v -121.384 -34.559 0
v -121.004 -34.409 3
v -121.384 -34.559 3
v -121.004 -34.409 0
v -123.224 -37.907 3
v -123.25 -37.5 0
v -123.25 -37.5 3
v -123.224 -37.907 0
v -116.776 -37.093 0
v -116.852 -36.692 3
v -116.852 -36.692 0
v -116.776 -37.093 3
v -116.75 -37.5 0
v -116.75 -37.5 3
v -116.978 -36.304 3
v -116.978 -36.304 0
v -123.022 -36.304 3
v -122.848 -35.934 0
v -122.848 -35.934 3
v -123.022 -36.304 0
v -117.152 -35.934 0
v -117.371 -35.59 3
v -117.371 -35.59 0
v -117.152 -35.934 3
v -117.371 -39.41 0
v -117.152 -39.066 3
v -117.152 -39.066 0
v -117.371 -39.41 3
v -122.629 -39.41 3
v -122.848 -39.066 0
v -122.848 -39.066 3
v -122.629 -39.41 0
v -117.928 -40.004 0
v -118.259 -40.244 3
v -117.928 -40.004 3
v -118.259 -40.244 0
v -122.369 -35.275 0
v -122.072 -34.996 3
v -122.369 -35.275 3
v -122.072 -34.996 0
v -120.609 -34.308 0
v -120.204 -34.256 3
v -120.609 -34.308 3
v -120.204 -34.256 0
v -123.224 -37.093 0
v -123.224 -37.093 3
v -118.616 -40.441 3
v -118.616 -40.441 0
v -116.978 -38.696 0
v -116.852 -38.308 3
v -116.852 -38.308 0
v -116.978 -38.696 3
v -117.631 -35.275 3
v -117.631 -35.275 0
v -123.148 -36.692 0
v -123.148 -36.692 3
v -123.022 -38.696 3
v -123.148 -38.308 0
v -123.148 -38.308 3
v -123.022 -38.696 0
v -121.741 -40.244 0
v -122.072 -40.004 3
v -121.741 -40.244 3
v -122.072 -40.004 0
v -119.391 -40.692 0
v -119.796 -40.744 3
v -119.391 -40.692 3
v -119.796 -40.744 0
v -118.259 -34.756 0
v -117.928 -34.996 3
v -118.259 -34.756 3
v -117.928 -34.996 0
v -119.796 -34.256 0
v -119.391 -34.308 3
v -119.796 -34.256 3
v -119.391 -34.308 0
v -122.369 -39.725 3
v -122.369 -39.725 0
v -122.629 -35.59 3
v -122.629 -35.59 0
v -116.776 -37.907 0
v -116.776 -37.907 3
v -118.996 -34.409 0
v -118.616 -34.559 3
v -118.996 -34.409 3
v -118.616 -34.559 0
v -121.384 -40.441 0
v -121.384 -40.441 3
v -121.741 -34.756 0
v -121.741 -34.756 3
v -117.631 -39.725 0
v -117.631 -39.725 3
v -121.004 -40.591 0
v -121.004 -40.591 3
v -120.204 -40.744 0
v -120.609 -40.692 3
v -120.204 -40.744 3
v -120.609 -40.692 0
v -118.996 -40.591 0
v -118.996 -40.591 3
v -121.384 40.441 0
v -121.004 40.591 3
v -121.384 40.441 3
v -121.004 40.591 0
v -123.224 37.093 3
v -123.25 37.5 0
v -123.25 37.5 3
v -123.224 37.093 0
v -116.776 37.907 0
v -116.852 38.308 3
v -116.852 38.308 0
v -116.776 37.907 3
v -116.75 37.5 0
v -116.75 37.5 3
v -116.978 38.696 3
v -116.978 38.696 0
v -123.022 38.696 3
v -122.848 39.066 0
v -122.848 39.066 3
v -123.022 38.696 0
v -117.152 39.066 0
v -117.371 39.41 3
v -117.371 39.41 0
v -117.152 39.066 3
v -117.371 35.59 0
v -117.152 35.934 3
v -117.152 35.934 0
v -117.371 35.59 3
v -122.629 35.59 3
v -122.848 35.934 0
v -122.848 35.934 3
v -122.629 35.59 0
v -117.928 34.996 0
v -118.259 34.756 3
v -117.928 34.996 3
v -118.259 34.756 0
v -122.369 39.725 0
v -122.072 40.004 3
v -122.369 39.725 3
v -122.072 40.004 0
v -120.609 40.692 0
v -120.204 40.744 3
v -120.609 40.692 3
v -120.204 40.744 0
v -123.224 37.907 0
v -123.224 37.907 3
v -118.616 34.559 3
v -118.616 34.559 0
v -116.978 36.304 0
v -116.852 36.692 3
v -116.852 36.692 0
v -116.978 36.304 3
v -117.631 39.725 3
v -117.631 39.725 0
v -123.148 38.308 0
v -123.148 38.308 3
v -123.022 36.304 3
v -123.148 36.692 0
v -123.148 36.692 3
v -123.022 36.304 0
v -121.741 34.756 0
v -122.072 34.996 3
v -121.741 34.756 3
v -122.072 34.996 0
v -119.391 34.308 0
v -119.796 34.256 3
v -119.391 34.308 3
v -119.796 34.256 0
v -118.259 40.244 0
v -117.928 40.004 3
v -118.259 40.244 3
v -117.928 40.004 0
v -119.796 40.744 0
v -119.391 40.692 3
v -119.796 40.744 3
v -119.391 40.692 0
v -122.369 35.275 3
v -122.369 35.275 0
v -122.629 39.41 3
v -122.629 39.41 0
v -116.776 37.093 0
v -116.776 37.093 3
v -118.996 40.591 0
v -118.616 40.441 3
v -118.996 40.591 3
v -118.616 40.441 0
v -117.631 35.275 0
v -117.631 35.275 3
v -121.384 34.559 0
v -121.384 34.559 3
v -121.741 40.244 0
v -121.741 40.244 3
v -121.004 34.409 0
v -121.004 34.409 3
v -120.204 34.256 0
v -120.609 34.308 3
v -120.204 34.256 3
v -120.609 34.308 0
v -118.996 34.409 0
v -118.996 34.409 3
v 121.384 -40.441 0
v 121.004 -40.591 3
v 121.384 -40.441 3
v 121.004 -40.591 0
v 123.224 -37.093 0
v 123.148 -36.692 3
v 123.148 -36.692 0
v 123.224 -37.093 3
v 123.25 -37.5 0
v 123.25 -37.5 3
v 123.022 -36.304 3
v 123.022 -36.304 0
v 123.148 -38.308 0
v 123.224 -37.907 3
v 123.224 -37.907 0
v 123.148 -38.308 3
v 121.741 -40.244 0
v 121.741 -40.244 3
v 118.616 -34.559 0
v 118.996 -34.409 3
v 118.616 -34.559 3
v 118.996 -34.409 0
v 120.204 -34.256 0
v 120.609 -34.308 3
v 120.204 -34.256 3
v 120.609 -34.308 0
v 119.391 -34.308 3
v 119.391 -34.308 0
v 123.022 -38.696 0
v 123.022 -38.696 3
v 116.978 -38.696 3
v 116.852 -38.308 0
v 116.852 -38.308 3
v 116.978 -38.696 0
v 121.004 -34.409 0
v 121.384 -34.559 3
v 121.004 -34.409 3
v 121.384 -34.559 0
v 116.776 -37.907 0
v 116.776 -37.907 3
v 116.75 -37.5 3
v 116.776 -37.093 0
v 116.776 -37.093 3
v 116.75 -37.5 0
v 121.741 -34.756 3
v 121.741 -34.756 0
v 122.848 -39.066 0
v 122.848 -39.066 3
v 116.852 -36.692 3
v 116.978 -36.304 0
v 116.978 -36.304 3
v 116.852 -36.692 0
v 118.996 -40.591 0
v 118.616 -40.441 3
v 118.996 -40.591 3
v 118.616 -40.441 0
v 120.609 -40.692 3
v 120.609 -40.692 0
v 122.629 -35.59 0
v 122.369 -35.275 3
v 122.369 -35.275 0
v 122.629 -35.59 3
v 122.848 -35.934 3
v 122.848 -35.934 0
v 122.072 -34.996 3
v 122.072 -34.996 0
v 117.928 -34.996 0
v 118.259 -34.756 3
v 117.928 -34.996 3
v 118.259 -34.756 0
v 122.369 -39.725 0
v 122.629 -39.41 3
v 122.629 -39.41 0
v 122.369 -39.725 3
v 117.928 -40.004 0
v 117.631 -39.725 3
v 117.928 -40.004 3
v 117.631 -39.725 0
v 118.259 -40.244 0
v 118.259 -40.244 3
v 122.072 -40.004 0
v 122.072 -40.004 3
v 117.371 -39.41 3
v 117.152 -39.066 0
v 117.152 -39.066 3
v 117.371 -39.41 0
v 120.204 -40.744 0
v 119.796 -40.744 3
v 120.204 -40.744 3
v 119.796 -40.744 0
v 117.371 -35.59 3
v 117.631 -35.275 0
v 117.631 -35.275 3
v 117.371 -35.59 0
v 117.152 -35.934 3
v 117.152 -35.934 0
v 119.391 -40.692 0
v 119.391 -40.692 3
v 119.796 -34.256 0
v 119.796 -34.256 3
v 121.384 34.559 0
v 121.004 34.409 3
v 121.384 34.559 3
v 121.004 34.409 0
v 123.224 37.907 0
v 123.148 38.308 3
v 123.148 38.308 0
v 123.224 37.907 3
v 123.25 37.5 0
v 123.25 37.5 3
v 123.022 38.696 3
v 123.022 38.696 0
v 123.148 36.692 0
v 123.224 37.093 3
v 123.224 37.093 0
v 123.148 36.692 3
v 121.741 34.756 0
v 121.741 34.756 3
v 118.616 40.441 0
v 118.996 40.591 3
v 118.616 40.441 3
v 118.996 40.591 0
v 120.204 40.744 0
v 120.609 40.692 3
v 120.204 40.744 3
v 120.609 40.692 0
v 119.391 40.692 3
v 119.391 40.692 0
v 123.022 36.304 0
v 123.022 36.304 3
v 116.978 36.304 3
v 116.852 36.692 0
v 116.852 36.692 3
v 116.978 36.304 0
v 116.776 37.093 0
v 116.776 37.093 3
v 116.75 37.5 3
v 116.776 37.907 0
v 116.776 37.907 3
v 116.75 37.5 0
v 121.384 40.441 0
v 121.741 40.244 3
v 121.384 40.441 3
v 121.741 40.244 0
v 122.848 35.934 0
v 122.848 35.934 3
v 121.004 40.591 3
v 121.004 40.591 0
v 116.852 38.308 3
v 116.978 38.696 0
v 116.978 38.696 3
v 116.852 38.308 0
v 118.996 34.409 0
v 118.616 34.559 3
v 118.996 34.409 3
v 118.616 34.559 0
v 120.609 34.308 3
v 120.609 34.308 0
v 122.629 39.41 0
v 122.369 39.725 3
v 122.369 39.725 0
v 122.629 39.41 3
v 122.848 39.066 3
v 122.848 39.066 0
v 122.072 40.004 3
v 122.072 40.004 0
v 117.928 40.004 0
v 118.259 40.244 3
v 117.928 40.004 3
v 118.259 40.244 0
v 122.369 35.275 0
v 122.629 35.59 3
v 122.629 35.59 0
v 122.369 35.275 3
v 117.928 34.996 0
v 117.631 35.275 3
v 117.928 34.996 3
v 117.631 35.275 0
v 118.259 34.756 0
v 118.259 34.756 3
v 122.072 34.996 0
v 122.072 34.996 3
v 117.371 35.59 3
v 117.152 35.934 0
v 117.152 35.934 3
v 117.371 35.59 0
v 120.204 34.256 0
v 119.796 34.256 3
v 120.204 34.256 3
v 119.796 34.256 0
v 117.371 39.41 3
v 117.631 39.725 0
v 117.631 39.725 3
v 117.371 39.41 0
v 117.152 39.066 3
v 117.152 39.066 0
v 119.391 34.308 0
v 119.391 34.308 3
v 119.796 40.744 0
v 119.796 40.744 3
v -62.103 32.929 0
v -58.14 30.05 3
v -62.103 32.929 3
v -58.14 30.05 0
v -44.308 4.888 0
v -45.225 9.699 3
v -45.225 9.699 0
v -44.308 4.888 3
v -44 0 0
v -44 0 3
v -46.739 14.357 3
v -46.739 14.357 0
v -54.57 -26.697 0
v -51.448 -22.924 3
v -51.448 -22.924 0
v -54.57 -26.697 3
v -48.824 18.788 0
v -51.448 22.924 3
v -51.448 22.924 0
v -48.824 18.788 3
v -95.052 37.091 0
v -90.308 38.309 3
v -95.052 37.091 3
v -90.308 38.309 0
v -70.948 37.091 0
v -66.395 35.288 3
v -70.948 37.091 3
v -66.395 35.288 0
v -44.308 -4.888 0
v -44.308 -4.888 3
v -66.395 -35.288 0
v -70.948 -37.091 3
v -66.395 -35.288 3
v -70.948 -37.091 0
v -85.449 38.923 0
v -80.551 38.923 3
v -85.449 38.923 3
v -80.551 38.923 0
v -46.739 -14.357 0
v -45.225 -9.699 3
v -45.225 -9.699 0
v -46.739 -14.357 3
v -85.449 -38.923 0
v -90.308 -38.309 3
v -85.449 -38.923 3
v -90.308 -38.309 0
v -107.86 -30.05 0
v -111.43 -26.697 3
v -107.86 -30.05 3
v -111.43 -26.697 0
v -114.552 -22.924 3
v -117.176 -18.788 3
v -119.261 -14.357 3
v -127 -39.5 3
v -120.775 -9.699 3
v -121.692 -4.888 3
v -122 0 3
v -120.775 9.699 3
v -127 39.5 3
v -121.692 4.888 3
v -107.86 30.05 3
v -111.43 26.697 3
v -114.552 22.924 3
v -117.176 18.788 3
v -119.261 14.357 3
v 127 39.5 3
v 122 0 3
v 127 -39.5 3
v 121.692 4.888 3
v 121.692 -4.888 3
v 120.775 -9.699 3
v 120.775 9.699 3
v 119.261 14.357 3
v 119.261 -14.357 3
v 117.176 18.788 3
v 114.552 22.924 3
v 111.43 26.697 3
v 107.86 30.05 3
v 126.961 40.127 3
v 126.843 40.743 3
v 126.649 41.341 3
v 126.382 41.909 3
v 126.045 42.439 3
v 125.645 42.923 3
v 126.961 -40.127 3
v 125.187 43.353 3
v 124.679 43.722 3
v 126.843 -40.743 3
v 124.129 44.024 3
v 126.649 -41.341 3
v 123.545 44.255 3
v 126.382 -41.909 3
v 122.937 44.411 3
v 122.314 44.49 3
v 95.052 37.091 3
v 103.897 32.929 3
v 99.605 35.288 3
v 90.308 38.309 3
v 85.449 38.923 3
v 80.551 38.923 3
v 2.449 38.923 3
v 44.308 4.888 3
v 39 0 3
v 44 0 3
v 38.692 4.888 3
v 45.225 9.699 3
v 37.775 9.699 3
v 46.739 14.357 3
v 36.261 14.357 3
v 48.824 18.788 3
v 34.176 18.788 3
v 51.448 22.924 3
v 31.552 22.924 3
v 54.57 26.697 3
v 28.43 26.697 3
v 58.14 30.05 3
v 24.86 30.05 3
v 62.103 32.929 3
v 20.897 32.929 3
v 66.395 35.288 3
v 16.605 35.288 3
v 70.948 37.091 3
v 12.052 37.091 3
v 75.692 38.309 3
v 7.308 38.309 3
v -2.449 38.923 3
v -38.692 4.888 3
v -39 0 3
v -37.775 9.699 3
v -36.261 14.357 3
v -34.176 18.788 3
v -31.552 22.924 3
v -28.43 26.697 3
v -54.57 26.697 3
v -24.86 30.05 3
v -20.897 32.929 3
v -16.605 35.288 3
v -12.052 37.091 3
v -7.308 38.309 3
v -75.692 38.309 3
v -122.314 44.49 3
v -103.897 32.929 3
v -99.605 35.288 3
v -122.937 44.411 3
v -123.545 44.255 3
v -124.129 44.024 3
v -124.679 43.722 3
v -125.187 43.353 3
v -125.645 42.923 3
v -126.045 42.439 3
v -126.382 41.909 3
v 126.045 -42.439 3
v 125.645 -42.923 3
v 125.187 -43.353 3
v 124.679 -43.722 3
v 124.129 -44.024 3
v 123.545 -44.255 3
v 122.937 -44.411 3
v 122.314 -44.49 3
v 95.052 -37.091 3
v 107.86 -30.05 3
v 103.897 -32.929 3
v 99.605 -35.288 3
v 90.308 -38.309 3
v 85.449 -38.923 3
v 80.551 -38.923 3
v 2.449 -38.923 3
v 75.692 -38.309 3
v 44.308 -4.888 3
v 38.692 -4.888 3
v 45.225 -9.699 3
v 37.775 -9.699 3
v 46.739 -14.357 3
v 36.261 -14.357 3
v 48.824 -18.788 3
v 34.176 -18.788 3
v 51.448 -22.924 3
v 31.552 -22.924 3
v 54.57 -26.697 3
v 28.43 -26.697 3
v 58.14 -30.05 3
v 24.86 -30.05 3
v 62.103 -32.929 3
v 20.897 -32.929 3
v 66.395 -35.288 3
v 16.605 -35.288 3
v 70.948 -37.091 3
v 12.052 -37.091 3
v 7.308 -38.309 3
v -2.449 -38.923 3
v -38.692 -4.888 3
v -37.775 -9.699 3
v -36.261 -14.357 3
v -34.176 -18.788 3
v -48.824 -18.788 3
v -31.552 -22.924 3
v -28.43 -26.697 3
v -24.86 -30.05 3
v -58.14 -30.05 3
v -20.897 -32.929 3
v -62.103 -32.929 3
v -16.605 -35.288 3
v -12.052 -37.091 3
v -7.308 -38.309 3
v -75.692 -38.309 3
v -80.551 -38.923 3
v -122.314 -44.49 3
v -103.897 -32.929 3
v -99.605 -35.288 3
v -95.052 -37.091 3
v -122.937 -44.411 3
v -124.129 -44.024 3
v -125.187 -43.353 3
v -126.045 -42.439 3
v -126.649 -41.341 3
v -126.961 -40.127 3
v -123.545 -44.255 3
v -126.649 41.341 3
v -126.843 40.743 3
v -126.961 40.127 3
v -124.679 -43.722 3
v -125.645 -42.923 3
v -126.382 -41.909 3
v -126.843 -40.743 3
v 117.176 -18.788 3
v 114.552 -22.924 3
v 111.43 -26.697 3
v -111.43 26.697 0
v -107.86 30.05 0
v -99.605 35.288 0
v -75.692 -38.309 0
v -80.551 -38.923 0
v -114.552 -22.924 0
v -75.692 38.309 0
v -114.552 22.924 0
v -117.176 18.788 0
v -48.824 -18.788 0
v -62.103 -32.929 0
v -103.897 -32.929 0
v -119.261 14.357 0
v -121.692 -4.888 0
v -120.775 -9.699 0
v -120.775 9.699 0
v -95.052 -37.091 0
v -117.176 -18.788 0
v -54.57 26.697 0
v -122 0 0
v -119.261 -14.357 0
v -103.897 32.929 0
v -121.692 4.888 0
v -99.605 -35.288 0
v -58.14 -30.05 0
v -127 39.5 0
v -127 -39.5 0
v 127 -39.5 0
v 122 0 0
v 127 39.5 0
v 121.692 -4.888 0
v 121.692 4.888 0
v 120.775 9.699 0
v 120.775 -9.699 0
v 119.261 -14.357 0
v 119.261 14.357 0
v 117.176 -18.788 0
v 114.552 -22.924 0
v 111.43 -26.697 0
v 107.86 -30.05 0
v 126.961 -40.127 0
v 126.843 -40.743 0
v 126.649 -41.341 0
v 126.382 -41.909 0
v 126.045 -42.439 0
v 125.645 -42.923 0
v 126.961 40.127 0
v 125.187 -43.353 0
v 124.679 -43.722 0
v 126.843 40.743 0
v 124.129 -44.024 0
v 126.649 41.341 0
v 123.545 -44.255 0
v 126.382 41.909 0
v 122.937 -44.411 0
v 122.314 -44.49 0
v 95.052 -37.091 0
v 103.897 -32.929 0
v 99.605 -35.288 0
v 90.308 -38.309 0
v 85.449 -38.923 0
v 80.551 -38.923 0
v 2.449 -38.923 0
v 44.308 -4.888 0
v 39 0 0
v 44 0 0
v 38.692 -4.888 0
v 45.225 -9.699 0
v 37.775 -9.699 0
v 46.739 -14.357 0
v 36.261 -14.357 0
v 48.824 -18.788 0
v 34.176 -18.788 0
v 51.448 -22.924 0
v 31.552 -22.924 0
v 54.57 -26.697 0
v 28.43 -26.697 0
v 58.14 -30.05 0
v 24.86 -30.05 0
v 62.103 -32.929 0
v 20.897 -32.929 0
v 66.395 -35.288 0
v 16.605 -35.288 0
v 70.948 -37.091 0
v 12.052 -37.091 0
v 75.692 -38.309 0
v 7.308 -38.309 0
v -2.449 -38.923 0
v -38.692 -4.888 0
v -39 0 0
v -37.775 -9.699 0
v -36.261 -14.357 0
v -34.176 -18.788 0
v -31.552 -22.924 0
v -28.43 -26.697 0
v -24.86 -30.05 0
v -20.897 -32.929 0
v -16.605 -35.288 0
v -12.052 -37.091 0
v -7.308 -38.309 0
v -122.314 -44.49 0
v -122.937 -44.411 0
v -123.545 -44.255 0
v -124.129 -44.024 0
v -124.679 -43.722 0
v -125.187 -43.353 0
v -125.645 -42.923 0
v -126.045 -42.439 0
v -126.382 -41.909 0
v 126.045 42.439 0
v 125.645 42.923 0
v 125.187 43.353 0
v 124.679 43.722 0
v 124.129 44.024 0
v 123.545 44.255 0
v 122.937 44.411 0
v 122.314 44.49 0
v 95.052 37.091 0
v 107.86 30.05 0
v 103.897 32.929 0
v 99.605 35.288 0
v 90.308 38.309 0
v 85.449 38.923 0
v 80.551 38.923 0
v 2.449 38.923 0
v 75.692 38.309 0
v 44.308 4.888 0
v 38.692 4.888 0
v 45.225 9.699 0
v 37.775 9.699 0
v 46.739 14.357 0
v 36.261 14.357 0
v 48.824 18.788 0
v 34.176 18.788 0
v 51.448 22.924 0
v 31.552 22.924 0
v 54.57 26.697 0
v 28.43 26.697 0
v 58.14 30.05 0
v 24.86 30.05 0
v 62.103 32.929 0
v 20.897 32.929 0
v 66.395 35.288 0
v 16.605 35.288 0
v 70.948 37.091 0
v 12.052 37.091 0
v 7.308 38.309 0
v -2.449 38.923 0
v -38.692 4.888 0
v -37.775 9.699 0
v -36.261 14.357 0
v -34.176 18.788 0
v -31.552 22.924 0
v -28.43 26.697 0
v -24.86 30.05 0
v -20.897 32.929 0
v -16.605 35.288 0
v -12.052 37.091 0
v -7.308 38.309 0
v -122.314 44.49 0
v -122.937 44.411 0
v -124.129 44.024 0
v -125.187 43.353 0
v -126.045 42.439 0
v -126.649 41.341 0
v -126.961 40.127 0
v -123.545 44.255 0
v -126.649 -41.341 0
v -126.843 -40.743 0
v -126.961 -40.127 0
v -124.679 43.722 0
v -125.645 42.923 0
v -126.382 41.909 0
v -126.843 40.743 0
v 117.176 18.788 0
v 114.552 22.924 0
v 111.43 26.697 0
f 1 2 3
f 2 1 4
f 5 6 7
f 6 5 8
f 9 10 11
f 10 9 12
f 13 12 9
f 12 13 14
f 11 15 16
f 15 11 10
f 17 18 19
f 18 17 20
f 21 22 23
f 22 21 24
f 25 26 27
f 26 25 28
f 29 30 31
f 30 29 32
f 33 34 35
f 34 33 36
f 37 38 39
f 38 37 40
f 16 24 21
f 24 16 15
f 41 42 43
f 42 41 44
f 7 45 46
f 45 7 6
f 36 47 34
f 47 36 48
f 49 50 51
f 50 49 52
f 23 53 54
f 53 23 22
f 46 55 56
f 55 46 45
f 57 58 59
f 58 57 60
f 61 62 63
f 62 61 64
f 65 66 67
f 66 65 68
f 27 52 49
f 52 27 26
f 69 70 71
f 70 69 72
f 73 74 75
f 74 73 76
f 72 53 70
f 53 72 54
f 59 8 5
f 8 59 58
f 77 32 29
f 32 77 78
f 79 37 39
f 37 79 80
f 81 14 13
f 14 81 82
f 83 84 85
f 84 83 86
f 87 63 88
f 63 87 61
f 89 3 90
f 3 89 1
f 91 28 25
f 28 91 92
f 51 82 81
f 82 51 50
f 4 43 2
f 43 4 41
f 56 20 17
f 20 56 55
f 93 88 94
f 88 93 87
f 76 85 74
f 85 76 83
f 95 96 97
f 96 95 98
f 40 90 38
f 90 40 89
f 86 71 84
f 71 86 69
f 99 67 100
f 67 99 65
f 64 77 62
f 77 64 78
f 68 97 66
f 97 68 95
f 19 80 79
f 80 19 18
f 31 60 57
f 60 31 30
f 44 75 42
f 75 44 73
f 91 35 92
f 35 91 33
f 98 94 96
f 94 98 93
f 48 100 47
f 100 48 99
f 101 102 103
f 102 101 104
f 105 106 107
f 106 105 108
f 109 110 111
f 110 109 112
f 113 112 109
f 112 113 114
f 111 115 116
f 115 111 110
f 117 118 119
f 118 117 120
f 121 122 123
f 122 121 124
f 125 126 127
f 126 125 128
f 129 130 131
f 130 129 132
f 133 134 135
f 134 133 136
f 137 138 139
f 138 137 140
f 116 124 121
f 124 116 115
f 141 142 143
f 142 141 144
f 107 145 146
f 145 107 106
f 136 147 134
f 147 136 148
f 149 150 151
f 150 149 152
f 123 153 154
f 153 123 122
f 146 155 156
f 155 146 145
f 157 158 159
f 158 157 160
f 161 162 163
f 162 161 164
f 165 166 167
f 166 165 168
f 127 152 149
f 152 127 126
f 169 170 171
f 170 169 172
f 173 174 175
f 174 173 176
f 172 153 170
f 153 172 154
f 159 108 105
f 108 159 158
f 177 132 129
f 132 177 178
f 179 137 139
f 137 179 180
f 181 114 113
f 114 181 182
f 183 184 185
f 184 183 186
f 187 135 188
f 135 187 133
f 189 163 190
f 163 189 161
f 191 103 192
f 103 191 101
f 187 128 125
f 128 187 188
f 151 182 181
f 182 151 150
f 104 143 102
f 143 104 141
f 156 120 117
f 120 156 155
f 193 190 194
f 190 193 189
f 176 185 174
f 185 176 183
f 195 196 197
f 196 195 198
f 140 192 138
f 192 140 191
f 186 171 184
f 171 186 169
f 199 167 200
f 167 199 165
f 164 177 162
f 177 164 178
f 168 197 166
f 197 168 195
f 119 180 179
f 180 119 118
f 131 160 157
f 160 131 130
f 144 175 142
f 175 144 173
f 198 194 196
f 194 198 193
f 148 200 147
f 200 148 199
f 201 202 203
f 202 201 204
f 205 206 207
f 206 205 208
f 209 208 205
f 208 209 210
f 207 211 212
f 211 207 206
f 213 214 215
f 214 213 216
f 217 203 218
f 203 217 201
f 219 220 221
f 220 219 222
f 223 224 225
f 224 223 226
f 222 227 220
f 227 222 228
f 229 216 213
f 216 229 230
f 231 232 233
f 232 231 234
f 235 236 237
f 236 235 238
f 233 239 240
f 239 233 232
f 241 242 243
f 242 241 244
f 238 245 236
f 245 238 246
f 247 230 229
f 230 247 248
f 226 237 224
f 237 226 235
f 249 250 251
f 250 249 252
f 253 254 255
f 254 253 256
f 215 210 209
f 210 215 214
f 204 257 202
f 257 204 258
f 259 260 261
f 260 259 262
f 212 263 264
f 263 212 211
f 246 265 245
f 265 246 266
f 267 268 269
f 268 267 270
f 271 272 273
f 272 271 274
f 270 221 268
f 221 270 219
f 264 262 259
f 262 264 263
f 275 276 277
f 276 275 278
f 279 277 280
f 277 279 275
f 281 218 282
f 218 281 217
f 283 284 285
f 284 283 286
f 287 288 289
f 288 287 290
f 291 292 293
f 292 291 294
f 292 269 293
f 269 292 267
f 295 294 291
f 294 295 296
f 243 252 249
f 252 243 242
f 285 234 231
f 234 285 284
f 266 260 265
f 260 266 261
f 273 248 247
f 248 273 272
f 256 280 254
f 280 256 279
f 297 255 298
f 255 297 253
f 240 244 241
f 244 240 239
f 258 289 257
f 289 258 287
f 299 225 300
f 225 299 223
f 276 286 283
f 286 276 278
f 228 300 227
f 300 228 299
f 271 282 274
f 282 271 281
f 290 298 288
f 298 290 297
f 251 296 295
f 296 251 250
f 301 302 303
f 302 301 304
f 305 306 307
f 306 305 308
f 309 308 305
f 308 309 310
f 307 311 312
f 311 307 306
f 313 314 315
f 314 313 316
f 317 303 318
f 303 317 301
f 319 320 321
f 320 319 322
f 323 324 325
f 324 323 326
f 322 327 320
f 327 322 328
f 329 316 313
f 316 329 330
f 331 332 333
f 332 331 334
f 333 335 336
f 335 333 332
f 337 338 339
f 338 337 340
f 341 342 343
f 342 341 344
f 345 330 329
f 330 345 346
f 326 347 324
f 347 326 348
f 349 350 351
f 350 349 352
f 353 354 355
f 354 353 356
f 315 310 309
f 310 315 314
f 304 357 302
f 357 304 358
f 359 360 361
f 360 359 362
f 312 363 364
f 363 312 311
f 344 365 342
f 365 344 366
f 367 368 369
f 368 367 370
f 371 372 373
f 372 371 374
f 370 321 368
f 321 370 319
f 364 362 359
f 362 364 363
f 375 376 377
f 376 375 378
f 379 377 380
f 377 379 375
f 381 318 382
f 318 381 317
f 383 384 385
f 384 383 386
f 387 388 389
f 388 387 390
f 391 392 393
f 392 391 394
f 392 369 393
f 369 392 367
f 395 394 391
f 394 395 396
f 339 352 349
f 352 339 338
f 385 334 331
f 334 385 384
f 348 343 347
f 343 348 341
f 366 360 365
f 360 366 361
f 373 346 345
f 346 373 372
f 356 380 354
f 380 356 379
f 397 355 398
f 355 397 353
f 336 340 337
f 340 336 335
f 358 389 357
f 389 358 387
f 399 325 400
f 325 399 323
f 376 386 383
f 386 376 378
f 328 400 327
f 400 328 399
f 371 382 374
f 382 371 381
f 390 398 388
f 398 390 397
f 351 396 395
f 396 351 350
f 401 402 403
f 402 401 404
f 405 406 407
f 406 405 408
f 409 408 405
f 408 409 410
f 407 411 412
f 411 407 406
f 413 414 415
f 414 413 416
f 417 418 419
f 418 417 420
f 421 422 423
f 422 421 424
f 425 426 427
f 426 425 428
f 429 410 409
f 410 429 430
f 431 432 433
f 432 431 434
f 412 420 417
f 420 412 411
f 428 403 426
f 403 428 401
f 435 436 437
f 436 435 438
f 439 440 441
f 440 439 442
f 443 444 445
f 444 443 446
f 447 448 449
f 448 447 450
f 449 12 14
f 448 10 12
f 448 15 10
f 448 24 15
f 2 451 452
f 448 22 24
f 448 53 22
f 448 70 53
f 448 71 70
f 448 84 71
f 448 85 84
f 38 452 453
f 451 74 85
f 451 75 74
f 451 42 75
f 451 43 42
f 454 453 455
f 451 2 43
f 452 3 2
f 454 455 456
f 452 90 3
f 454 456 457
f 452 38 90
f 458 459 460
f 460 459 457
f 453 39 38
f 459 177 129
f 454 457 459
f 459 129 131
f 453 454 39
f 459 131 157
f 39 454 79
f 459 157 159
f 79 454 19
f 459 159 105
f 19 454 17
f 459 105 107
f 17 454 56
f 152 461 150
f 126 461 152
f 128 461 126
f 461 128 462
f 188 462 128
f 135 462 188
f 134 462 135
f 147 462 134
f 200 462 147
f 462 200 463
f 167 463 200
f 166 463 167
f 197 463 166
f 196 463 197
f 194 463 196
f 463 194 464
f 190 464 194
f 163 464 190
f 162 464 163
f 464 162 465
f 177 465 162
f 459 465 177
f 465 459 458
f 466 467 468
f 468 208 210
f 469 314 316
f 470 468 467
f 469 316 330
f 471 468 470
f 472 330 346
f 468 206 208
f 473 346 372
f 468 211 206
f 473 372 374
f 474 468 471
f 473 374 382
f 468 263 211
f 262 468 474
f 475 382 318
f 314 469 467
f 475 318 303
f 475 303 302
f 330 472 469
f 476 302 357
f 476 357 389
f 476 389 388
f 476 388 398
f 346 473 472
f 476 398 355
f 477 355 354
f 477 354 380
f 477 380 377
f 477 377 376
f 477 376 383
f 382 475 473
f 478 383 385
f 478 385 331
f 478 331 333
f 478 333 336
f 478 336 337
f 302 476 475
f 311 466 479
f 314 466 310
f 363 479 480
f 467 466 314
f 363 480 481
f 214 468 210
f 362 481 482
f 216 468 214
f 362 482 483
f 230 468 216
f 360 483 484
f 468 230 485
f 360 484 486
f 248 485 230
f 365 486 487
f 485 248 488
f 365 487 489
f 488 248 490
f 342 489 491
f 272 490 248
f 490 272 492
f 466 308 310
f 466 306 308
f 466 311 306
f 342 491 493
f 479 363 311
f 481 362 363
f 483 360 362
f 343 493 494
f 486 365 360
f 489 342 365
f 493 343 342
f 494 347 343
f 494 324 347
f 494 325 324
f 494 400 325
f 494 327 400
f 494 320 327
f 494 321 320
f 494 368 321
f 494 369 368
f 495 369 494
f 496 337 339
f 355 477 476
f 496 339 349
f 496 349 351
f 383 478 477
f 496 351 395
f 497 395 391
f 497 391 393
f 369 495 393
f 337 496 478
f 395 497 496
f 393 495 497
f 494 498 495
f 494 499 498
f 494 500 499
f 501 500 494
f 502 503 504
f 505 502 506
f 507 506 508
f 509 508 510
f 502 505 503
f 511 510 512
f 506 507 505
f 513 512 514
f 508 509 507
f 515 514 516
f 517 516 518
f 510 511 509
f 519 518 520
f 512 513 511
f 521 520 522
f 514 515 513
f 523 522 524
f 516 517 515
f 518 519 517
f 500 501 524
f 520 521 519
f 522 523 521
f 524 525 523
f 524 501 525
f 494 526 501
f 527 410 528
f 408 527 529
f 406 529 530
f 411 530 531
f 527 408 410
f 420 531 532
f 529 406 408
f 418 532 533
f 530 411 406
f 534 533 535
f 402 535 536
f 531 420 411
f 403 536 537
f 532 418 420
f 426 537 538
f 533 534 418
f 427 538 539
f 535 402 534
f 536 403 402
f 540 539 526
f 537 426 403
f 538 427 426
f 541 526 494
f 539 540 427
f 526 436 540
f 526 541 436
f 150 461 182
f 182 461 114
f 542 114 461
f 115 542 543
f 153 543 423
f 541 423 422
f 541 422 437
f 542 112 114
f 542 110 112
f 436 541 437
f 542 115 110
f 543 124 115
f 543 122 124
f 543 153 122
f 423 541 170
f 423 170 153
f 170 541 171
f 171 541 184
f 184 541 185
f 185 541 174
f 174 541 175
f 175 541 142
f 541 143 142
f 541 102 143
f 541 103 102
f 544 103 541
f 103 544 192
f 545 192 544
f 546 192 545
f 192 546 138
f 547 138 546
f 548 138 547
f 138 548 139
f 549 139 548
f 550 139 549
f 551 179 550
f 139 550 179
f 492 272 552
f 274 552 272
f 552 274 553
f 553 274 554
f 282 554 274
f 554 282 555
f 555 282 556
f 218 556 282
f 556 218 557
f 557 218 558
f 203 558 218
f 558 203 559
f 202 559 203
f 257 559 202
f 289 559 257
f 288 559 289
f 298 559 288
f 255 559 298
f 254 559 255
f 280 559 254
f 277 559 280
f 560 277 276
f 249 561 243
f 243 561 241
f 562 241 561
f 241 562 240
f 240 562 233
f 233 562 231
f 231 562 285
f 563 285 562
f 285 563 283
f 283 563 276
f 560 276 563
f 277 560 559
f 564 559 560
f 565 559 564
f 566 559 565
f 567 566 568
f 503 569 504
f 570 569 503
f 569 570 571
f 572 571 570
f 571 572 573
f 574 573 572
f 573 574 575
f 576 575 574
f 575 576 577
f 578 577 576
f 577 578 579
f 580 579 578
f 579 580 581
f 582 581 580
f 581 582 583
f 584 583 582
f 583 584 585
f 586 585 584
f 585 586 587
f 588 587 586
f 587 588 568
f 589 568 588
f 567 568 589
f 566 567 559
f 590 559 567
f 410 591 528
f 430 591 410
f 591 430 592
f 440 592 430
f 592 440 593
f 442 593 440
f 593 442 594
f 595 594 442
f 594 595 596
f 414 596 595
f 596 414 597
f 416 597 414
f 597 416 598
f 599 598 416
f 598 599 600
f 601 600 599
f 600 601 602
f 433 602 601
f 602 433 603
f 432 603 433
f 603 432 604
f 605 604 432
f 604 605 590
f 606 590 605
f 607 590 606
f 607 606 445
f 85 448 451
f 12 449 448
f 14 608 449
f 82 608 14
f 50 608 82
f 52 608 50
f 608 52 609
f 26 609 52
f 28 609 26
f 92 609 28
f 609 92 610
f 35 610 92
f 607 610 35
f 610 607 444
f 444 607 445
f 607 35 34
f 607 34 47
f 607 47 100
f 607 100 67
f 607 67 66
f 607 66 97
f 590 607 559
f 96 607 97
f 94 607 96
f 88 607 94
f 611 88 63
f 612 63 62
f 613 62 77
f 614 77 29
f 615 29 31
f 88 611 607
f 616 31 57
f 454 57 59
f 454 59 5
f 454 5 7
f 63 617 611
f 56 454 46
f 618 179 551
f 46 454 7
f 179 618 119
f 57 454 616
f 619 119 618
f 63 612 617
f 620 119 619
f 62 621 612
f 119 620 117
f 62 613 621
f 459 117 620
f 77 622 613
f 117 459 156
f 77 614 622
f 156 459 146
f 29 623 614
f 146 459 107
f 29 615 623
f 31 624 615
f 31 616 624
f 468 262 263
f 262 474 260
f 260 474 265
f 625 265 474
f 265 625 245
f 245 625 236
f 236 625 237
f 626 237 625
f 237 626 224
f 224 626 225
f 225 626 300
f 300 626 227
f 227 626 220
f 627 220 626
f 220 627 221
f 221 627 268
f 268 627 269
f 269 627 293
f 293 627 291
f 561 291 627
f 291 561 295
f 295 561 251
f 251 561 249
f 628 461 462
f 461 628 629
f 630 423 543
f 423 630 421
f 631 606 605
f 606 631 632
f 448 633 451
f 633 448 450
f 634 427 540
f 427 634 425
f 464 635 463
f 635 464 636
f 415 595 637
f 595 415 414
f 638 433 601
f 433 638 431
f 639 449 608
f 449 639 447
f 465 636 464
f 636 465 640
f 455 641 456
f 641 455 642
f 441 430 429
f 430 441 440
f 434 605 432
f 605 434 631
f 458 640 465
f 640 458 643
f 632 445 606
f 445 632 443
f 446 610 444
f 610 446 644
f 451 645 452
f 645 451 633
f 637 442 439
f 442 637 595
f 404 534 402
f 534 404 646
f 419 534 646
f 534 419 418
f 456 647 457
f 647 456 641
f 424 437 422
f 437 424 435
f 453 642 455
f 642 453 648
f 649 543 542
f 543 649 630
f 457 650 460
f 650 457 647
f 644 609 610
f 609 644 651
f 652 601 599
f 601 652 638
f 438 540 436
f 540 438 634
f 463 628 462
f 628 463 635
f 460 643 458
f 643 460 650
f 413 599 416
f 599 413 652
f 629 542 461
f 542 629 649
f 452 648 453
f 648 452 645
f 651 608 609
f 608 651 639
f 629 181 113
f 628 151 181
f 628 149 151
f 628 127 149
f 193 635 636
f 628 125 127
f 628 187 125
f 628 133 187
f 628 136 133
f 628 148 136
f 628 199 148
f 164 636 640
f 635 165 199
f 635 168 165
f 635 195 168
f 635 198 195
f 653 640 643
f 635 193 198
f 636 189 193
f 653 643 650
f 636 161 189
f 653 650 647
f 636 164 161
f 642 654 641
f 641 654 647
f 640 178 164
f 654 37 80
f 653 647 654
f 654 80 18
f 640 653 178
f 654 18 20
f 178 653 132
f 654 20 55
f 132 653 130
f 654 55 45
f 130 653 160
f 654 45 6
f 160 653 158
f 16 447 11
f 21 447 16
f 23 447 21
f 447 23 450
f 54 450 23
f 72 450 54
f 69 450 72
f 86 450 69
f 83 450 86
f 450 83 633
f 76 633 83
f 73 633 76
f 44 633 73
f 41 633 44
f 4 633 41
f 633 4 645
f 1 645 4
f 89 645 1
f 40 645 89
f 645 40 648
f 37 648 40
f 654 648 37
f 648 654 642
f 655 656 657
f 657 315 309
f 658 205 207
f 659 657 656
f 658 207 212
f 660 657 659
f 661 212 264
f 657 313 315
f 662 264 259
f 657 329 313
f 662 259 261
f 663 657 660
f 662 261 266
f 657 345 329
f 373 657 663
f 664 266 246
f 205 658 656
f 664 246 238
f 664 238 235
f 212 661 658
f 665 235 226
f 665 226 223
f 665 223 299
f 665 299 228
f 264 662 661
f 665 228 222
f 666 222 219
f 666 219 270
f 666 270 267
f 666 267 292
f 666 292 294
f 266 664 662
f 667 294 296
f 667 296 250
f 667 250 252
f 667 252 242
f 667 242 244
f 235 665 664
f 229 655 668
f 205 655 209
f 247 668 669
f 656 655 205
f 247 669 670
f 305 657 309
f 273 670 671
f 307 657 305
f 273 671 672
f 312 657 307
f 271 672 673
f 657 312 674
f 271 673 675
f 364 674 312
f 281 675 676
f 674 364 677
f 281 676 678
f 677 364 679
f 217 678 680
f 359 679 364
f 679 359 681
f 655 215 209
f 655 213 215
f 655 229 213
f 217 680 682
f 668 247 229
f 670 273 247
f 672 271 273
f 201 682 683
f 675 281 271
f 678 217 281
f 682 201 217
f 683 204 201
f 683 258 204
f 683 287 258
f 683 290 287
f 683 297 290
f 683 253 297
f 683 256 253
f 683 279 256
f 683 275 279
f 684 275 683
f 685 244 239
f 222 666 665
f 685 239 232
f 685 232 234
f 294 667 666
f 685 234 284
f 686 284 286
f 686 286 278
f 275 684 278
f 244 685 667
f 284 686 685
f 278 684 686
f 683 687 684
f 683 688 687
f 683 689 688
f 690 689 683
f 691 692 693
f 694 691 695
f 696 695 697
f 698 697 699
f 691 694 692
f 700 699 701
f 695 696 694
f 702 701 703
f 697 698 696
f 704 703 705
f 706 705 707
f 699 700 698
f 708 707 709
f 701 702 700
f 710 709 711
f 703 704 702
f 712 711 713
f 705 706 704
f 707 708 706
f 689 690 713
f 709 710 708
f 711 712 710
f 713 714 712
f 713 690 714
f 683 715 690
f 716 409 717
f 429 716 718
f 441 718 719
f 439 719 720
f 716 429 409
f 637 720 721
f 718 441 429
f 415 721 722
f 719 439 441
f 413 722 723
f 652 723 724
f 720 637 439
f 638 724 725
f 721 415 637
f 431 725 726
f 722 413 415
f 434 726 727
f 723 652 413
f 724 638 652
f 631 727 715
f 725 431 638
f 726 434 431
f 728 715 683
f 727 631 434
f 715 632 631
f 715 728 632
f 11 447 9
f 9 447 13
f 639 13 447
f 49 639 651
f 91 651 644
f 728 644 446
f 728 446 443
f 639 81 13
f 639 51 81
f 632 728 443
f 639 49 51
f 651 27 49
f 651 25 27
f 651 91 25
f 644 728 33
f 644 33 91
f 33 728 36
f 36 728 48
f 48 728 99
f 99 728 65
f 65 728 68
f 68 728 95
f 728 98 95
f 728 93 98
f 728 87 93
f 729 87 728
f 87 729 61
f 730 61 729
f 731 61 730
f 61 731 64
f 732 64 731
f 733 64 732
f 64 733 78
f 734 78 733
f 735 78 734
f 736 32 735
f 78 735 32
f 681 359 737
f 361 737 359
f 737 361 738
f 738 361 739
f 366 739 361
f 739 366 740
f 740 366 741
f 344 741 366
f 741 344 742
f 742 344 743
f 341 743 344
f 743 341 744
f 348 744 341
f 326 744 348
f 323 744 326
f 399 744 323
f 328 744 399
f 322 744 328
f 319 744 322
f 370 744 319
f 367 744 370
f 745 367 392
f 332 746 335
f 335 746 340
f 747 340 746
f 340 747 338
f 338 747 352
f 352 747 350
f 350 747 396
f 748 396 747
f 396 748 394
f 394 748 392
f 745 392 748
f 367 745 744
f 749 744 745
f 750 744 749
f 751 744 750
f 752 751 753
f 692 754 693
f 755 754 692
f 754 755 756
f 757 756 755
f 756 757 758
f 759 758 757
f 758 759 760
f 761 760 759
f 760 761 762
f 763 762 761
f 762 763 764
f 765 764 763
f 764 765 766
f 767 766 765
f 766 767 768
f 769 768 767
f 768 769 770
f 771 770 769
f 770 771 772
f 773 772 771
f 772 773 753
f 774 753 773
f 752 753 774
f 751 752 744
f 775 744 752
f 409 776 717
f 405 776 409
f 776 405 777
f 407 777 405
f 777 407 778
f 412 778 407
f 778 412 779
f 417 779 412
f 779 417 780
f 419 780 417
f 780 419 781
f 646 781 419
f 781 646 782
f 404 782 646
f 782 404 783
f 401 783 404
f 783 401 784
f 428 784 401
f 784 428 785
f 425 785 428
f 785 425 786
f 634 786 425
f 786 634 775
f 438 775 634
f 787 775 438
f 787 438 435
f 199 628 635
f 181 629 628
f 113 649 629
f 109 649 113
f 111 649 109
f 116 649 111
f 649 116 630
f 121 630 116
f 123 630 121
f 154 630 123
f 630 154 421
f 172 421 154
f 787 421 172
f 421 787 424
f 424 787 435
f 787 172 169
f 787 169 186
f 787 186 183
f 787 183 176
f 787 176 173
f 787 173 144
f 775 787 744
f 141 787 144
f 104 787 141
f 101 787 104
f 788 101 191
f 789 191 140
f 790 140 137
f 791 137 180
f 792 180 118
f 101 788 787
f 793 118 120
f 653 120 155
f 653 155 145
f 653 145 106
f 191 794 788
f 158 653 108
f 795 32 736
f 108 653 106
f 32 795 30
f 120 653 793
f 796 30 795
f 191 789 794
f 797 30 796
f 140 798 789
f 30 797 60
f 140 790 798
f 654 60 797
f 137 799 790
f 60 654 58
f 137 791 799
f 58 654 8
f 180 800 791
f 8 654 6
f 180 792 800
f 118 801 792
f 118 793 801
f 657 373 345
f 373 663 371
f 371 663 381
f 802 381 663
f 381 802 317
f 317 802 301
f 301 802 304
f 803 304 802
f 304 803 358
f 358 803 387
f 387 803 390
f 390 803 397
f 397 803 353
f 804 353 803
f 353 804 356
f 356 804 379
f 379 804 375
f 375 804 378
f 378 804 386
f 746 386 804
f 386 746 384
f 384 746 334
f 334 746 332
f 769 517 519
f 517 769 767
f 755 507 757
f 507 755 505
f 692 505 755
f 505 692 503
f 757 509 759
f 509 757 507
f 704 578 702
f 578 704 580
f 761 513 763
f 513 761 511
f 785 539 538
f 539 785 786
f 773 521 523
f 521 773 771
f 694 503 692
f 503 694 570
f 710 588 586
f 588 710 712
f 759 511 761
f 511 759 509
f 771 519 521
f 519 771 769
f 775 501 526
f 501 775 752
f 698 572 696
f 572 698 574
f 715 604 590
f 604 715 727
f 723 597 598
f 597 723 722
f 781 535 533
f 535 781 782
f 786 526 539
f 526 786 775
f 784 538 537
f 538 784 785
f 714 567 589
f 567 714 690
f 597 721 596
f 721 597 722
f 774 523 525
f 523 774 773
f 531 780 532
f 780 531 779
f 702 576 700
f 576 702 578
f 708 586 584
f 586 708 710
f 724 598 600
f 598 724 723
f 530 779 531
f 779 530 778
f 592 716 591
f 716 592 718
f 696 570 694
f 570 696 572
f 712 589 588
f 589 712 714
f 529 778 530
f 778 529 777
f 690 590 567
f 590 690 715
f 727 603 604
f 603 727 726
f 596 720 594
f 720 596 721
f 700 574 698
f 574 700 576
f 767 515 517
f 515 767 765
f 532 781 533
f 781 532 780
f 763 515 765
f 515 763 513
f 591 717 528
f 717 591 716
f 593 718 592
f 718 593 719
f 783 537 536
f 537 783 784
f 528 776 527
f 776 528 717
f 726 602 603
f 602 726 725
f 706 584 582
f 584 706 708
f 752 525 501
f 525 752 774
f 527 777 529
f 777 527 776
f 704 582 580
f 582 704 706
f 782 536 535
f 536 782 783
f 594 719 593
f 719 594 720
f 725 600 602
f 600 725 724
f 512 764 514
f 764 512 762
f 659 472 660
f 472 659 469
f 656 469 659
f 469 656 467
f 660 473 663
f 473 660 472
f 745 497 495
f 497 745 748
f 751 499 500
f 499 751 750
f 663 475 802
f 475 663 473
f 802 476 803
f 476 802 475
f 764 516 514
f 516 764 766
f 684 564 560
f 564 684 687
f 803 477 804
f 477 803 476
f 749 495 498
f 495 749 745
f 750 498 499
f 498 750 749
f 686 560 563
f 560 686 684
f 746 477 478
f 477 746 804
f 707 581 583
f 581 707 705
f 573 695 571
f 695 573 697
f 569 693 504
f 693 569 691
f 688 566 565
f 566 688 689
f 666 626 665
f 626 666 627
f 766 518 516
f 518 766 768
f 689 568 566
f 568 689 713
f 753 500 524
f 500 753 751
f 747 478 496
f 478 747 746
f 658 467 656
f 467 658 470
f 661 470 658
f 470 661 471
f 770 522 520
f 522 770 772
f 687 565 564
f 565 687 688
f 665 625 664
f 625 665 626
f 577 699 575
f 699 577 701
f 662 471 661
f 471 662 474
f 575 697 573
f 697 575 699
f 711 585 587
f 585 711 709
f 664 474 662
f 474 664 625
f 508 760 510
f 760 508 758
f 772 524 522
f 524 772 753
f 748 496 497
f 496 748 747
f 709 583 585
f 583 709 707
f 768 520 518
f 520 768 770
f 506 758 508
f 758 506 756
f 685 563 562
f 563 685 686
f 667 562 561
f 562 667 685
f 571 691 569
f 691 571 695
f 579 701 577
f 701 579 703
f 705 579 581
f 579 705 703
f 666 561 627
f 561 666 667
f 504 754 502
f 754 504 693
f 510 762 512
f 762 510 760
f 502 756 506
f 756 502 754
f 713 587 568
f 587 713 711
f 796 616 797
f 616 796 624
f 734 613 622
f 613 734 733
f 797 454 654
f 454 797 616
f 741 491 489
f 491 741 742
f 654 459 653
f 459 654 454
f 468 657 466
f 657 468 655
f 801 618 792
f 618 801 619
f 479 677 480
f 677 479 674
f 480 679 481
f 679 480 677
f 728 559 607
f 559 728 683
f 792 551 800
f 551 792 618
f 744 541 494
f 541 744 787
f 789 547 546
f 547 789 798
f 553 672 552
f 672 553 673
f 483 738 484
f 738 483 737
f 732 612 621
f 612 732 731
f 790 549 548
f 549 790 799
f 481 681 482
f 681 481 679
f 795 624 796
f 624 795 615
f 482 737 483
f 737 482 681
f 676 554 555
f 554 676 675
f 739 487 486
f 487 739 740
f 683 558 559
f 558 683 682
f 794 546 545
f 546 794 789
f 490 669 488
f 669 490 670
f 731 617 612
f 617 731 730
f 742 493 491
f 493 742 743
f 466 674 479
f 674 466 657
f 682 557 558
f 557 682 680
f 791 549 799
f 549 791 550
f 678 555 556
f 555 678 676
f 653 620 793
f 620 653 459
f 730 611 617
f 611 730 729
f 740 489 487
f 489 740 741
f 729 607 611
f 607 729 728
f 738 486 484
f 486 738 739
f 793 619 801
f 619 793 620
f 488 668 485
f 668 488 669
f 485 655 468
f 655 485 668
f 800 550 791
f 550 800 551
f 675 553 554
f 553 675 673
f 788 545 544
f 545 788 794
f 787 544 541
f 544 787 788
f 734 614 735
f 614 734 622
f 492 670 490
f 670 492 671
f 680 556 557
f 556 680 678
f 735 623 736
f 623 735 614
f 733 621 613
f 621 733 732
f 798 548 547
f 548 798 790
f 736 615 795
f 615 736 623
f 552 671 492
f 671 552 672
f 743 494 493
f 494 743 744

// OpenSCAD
$fn = 50;


difference() {
	union() {
		hull() {
			translate(v = [-122.0000000000, 39.5000000000, 0]) {
				cylinder(h = 3, r = 5);
			}
			translate(v = [122.0000000000, 39.5000000000, 0]) {
				cylinder(h = 3, r = 5);
			}
			translate(v = [-122.0000000000, -39.5000000000, 0]) {
				cylinder(h = 3, r = 5);
			}
			translate(v = [122.0000000000, -39.5000000000, 0]) {
				cylinder(h = 3, r = 5);
			}
		}
	}
	union() {
		#translate(v = [-120.0000000000, -37.5000000000, -100.0000000000]) {
			cylinder(h = 200, r = 3.2500000000);
		}
		#translate(v = [-120.0000000000, 37.5000000000, -100.0000000000]) {
			cylinder(h = 200, r = 3.2500000000);
		}
		#translate(v = [120.0000000000, -37.5000000000, -100.0000000000]) {
			cylinder(h = 200, r = 3.2500000000);
		}
		#translate(v = [120.0000000000, 37.5000000000, -100.0000000000]) {
			cylinder(h = 200, r = 3.2500000000);
		}
		#translate(v = [-83.0000000000, 0, 0]) {
			cylinder(h = 3, r = 39.0000000000);
		}
		#cylinder(h = 3, r = 39.0000000000);
		#translate(v = [83.0000000000, 0, 0]) {
			cylinder(h = 3, r = 39.0000000000);
		}
	}
}
